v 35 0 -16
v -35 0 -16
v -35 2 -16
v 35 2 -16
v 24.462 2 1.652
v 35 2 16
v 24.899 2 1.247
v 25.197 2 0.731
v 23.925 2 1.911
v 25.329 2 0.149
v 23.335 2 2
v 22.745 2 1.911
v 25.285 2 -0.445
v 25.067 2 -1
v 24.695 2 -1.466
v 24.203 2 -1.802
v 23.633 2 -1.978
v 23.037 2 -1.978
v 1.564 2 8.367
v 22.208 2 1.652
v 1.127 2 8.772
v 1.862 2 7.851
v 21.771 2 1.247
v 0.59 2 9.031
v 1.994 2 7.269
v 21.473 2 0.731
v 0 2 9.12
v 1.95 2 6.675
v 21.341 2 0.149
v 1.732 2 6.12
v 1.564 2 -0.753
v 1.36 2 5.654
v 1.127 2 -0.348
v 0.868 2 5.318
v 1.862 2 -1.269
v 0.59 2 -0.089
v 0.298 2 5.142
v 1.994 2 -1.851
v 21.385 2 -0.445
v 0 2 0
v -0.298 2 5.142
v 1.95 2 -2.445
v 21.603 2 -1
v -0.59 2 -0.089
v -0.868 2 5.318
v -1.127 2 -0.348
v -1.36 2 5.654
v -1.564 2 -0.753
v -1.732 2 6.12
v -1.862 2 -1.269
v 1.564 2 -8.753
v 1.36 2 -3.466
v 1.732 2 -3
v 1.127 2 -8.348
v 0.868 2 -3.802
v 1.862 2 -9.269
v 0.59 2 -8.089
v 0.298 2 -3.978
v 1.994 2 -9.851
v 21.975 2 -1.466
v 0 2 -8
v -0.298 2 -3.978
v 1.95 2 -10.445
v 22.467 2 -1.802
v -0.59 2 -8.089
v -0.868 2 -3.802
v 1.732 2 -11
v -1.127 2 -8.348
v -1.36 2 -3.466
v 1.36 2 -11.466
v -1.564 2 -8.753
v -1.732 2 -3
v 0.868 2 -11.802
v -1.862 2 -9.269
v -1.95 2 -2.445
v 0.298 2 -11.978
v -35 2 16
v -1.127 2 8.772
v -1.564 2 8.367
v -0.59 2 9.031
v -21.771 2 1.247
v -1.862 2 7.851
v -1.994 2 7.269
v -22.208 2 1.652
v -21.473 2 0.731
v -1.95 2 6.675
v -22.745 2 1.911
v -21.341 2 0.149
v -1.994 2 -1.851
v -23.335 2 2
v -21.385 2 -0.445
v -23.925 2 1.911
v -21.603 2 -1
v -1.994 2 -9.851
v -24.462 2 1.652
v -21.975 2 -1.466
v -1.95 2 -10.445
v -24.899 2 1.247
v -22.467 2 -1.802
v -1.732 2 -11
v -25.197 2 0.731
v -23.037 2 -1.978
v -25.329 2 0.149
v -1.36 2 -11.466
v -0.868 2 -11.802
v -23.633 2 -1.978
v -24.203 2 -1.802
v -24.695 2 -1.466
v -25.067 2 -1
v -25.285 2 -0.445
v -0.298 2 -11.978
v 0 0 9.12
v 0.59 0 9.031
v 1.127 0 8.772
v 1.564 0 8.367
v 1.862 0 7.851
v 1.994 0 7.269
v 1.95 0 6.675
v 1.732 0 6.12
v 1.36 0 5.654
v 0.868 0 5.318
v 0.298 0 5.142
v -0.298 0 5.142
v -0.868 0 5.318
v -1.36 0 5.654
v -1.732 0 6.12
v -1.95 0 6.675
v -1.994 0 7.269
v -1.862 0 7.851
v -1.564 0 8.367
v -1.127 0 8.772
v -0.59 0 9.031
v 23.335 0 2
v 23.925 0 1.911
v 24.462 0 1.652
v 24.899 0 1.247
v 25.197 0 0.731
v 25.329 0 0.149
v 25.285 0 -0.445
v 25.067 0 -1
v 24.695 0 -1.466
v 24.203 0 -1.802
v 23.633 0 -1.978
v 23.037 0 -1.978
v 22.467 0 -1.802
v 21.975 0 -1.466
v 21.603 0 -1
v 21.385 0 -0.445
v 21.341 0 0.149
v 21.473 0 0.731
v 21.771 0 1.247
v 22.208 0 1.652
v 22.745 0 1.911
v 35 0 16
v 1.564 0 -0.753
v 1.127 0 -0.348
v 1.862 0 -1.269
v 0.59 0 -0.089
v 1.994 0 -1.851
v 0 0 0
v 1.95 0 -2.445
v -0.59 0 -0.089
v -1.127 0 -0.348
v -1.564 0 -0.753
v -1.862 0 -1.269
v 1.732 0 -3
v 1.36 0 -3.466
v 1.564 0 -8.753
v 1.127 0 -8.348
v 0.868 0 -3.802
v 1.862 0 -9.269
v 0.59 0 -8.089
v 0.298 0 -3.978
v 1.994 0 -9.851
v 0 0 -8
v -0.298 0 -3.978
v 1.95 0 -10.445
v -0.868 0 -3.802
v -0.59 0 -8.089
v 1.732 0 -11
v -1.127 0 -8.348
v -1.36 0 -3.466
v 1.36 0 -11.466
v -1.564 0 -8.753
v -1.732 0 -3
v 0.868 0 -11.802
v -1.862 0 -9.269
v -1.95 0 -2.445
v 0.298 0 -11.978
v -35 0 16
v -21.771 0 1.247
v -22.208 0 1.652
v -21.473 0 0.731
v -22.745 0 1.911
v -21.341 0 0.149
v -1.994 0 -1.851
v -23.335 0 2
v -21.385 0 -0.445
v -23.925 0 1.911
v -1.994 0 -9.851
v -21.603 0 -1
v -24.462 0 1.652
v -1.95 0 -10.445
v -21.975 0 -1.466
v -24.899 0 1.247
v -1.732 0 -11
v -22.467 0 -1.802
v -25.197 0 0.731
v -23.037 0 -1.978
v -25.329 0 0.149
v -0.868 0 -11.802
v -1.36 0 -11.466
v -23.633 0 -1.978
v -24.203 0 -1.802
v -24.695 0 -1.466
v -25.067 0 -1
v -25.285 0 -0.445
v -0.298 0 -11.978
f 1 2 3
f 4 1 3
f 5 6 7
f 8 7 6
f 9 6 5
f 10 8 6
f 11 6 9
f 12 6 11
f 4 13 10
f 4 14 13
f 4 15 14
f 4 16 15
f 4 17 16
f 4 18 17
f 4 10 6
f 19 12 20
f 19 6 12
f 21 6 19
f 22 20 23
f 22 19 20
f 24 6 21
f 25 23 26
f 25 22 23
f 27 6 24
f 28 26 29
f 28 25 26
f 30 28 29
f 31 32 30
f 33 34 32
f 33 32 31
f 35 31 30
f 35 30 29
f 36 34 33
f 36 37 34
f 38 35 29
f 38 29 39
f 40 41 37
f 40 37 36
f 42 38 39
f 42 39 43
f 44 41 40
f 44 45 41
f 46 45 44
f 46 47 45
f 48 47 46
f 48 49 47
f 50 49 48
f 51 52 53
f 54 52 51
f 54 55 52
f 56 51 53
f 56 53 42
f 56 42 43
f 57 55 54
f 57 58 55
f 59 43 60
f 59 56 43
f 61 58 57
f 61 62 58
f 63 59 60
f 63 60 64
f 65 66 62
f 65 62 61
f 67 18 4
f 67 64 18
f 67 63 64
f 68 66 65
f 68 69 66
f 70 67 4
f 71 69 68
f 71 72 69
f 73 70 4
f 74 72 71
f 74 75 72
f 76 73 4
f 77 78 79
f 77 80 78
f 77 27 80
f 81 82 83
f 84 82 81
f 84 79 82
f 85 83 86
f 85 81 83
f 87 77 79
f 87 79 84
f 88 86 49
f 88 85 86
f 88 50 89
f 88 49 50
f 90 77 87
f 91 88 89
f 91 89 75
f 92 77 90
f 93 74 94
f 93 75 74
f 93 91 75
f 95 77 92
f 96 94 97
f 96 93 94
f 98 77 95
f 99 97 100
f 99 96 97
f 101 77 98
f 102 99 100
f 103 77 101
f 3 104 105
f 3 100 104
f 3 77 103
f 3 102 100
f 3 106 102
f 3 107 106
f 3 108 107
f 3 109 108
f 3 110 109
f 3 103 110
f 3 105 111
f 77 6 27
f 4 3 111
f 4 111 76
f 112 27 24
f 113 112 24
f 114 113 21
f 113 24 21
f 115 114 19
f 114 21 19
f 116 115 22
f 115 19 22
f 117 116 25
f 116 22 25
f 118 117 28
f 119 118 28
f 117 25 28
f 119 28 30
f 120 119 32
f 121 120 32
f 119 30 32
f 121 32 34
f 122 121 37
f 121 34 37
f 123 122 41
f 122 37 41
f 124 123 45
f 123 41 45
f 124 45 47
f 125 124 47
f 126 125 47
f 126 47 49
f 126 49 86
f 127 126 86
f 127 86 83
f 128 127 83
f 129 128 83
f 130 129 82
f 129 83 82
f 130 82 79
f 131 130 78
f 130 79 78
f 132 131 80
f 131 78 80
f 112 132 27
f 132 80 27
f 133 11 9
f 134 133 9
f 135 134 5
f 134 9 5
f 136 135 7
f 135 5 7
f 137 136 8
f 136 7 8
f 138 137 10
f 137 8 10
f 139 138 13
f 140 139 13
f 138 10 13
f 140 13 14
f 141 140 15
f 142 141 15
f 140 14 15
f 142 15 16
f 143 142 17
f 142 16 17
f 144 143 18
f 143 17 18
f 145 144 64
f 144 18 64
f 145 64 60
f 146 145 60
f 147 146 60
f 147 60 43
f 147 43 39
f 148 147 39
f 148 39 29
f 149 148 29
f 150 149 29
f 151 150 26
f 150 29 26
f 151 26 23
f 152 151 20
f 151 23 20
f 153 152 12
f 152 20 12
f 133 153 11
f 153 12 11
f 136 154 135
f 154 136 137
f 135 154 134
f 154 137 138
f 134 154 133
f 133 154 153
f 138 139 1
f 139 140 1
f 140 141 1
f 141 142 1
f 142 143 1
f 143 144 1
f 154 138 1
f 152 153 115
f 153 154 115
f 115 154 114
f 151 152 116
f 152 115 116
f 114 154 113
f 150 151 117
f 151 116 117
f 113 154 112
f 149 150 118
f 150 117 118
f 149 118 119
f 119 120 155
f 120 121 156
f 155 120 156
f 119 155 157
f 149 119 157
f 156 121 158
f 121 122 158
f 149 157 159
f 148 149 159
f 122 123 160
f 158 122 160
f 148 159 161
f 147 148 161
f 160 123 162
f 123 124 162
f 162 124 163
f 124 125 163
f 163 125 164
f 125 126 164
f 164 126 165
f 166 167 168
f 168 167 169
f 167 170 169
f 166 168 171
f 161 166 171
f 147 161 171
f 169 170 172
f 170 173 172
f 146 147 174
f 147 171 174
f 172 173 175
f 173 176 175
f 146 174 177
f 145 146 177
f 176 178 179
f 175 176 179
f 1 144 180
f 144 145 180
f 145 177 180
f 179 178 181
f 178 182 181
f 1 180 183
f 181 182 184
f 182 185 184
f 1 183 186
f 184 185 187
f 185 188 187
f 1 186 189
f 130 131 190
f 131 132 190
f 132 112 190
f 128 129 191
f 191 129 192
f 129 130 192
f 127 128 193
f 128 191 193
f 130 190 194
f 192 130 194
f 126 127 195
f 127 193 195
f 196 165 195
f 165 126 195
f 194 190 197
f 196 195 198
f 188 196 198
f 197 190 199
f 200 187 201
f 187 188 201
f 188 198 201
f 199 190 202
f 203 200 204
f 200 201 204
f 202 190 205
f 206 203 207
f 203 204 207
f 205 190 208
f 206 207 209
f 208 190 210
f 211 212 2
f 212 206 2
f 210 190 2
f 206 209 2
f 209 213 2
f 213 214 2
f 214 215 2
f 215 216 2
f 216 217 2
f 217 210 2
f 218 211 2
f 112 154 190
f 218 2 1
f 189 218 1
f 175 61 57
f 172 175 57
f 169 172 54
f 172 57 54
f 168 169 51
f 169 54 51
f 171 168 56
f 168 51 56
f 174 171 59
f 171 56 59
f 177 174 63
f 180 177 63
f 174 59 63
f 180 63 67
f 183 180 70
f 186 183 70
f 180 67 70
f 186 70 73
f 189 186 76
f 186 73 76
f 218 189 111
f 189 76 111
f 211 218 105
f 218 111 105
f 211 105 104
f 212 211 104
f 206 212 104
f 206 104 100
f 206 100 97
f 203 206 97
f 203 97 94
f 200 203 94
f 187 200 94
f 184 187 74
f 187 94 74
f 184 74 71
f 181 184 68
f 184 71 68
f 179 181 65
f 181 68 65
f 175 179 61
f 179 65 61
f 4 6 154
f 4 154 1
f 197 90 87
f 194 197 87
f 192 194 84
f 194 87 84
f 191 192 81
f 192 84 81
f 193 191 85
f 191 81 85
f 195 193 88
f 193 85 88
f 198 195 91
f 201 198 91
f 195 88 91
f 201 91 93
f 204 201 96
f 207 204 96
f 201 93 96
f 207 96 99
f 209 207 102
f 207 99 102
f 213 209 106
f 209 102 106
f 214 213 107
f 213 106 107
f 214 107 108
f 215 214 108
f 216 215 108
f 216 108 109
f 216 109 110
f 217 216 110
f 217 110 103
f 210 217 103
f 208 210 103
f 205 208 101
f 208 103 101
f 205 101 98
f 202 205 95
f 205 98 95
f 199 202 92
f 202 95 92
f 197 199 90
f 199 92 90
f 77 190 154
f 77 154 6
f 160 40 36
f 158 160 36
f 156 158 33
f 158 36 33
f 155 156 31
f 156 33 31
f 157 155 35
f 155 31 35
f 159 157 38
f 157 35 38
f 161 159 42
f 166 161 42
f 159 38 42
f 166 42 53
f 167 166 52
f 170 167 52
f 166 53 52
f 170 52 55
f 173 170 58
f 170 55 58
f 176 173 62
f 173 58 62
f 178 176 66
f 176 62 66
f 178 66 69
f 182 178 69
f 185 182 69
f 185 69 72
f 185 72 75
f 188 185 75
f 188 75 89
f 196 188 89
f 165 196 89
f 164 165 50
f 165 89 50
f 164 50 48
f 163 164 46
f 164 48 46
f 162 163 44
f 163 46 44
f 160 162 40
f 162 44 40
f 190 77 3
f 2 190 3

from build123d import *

# Parameters (mm, degrees)
BOSS_EXTRUDE1_DEPTH      = 35
BOSS_EXTRUDE1_DEPTH_BACK = 35
SKETCH1_W                = 32
SKETCH1_H                = 2
SKETCH2_R                = 2
CUT_EXTRUDE2_DEPTH       = 2
SKETCH3_R                = 2
CUT_EXTRUDE3_DEPTH       = 2


with BuildPart() as part:
    # Sketch1 → Boss-Extrude1 (new, two sides: drawn at the far end of the back side and taken through both)
    with BuildSketch(Plane(origin=(0, 0, 0), x_dir=(0, 0, -1), z_dir=(1, 0, 0)).offset(-BOSS_EXTRUDE1_DEPTH_BACK)):
        with Locations((0, 1)):
            Rectangle(SKETCH1_W, SKETCH1_H)
    extrude(amount=BOSS_EXTRUDE1_DEPTH + BOSS_EXTRUDE1_DEPTH_BACK)

    # Sketch2 → Cut-Extrude2 (cut)
    with BuildSketch(Plane(origin=(0, 2, 0), x_dir=(1, 0, 0), z_dir=(0, 1, 0))):
        with Locations(Location((-23.335, 0, 0), (0, 0, 270))):
            Circle(SKETCH2_R)
        with Locations(Location((23.335, 0, 0), (0, 0, 270))):
            Circle(SKETCH2_R)
    extrude(amount=-CUT_EXTRUDE2_DEPTH, mode=Mode.SUBTRACT)

    # Sketch3 → Cut-Extrude3 (cut)
    with BuildSketch(Plane(origin=(0, 2, 0), x_dir=(1, 0, 0), z_dir=(0, 1, 0))):
        with Locations(Location((0, 10, 0), (0, 0, 270))):
            Circle(SKETCH3_R)
        with Locations(Location((0, 2, 0), (0, 0, 270))):
            Circle(SKETCH3_R)
        with Locations(Location((0, -7.12, 0), (0, 0, 270))):
            Circle(SKETCH3_R)
    extrude(amount=-CUT_EXTRUDE3_DEPTH, mode=Mode.SUBTRACT)


solid = part.part
